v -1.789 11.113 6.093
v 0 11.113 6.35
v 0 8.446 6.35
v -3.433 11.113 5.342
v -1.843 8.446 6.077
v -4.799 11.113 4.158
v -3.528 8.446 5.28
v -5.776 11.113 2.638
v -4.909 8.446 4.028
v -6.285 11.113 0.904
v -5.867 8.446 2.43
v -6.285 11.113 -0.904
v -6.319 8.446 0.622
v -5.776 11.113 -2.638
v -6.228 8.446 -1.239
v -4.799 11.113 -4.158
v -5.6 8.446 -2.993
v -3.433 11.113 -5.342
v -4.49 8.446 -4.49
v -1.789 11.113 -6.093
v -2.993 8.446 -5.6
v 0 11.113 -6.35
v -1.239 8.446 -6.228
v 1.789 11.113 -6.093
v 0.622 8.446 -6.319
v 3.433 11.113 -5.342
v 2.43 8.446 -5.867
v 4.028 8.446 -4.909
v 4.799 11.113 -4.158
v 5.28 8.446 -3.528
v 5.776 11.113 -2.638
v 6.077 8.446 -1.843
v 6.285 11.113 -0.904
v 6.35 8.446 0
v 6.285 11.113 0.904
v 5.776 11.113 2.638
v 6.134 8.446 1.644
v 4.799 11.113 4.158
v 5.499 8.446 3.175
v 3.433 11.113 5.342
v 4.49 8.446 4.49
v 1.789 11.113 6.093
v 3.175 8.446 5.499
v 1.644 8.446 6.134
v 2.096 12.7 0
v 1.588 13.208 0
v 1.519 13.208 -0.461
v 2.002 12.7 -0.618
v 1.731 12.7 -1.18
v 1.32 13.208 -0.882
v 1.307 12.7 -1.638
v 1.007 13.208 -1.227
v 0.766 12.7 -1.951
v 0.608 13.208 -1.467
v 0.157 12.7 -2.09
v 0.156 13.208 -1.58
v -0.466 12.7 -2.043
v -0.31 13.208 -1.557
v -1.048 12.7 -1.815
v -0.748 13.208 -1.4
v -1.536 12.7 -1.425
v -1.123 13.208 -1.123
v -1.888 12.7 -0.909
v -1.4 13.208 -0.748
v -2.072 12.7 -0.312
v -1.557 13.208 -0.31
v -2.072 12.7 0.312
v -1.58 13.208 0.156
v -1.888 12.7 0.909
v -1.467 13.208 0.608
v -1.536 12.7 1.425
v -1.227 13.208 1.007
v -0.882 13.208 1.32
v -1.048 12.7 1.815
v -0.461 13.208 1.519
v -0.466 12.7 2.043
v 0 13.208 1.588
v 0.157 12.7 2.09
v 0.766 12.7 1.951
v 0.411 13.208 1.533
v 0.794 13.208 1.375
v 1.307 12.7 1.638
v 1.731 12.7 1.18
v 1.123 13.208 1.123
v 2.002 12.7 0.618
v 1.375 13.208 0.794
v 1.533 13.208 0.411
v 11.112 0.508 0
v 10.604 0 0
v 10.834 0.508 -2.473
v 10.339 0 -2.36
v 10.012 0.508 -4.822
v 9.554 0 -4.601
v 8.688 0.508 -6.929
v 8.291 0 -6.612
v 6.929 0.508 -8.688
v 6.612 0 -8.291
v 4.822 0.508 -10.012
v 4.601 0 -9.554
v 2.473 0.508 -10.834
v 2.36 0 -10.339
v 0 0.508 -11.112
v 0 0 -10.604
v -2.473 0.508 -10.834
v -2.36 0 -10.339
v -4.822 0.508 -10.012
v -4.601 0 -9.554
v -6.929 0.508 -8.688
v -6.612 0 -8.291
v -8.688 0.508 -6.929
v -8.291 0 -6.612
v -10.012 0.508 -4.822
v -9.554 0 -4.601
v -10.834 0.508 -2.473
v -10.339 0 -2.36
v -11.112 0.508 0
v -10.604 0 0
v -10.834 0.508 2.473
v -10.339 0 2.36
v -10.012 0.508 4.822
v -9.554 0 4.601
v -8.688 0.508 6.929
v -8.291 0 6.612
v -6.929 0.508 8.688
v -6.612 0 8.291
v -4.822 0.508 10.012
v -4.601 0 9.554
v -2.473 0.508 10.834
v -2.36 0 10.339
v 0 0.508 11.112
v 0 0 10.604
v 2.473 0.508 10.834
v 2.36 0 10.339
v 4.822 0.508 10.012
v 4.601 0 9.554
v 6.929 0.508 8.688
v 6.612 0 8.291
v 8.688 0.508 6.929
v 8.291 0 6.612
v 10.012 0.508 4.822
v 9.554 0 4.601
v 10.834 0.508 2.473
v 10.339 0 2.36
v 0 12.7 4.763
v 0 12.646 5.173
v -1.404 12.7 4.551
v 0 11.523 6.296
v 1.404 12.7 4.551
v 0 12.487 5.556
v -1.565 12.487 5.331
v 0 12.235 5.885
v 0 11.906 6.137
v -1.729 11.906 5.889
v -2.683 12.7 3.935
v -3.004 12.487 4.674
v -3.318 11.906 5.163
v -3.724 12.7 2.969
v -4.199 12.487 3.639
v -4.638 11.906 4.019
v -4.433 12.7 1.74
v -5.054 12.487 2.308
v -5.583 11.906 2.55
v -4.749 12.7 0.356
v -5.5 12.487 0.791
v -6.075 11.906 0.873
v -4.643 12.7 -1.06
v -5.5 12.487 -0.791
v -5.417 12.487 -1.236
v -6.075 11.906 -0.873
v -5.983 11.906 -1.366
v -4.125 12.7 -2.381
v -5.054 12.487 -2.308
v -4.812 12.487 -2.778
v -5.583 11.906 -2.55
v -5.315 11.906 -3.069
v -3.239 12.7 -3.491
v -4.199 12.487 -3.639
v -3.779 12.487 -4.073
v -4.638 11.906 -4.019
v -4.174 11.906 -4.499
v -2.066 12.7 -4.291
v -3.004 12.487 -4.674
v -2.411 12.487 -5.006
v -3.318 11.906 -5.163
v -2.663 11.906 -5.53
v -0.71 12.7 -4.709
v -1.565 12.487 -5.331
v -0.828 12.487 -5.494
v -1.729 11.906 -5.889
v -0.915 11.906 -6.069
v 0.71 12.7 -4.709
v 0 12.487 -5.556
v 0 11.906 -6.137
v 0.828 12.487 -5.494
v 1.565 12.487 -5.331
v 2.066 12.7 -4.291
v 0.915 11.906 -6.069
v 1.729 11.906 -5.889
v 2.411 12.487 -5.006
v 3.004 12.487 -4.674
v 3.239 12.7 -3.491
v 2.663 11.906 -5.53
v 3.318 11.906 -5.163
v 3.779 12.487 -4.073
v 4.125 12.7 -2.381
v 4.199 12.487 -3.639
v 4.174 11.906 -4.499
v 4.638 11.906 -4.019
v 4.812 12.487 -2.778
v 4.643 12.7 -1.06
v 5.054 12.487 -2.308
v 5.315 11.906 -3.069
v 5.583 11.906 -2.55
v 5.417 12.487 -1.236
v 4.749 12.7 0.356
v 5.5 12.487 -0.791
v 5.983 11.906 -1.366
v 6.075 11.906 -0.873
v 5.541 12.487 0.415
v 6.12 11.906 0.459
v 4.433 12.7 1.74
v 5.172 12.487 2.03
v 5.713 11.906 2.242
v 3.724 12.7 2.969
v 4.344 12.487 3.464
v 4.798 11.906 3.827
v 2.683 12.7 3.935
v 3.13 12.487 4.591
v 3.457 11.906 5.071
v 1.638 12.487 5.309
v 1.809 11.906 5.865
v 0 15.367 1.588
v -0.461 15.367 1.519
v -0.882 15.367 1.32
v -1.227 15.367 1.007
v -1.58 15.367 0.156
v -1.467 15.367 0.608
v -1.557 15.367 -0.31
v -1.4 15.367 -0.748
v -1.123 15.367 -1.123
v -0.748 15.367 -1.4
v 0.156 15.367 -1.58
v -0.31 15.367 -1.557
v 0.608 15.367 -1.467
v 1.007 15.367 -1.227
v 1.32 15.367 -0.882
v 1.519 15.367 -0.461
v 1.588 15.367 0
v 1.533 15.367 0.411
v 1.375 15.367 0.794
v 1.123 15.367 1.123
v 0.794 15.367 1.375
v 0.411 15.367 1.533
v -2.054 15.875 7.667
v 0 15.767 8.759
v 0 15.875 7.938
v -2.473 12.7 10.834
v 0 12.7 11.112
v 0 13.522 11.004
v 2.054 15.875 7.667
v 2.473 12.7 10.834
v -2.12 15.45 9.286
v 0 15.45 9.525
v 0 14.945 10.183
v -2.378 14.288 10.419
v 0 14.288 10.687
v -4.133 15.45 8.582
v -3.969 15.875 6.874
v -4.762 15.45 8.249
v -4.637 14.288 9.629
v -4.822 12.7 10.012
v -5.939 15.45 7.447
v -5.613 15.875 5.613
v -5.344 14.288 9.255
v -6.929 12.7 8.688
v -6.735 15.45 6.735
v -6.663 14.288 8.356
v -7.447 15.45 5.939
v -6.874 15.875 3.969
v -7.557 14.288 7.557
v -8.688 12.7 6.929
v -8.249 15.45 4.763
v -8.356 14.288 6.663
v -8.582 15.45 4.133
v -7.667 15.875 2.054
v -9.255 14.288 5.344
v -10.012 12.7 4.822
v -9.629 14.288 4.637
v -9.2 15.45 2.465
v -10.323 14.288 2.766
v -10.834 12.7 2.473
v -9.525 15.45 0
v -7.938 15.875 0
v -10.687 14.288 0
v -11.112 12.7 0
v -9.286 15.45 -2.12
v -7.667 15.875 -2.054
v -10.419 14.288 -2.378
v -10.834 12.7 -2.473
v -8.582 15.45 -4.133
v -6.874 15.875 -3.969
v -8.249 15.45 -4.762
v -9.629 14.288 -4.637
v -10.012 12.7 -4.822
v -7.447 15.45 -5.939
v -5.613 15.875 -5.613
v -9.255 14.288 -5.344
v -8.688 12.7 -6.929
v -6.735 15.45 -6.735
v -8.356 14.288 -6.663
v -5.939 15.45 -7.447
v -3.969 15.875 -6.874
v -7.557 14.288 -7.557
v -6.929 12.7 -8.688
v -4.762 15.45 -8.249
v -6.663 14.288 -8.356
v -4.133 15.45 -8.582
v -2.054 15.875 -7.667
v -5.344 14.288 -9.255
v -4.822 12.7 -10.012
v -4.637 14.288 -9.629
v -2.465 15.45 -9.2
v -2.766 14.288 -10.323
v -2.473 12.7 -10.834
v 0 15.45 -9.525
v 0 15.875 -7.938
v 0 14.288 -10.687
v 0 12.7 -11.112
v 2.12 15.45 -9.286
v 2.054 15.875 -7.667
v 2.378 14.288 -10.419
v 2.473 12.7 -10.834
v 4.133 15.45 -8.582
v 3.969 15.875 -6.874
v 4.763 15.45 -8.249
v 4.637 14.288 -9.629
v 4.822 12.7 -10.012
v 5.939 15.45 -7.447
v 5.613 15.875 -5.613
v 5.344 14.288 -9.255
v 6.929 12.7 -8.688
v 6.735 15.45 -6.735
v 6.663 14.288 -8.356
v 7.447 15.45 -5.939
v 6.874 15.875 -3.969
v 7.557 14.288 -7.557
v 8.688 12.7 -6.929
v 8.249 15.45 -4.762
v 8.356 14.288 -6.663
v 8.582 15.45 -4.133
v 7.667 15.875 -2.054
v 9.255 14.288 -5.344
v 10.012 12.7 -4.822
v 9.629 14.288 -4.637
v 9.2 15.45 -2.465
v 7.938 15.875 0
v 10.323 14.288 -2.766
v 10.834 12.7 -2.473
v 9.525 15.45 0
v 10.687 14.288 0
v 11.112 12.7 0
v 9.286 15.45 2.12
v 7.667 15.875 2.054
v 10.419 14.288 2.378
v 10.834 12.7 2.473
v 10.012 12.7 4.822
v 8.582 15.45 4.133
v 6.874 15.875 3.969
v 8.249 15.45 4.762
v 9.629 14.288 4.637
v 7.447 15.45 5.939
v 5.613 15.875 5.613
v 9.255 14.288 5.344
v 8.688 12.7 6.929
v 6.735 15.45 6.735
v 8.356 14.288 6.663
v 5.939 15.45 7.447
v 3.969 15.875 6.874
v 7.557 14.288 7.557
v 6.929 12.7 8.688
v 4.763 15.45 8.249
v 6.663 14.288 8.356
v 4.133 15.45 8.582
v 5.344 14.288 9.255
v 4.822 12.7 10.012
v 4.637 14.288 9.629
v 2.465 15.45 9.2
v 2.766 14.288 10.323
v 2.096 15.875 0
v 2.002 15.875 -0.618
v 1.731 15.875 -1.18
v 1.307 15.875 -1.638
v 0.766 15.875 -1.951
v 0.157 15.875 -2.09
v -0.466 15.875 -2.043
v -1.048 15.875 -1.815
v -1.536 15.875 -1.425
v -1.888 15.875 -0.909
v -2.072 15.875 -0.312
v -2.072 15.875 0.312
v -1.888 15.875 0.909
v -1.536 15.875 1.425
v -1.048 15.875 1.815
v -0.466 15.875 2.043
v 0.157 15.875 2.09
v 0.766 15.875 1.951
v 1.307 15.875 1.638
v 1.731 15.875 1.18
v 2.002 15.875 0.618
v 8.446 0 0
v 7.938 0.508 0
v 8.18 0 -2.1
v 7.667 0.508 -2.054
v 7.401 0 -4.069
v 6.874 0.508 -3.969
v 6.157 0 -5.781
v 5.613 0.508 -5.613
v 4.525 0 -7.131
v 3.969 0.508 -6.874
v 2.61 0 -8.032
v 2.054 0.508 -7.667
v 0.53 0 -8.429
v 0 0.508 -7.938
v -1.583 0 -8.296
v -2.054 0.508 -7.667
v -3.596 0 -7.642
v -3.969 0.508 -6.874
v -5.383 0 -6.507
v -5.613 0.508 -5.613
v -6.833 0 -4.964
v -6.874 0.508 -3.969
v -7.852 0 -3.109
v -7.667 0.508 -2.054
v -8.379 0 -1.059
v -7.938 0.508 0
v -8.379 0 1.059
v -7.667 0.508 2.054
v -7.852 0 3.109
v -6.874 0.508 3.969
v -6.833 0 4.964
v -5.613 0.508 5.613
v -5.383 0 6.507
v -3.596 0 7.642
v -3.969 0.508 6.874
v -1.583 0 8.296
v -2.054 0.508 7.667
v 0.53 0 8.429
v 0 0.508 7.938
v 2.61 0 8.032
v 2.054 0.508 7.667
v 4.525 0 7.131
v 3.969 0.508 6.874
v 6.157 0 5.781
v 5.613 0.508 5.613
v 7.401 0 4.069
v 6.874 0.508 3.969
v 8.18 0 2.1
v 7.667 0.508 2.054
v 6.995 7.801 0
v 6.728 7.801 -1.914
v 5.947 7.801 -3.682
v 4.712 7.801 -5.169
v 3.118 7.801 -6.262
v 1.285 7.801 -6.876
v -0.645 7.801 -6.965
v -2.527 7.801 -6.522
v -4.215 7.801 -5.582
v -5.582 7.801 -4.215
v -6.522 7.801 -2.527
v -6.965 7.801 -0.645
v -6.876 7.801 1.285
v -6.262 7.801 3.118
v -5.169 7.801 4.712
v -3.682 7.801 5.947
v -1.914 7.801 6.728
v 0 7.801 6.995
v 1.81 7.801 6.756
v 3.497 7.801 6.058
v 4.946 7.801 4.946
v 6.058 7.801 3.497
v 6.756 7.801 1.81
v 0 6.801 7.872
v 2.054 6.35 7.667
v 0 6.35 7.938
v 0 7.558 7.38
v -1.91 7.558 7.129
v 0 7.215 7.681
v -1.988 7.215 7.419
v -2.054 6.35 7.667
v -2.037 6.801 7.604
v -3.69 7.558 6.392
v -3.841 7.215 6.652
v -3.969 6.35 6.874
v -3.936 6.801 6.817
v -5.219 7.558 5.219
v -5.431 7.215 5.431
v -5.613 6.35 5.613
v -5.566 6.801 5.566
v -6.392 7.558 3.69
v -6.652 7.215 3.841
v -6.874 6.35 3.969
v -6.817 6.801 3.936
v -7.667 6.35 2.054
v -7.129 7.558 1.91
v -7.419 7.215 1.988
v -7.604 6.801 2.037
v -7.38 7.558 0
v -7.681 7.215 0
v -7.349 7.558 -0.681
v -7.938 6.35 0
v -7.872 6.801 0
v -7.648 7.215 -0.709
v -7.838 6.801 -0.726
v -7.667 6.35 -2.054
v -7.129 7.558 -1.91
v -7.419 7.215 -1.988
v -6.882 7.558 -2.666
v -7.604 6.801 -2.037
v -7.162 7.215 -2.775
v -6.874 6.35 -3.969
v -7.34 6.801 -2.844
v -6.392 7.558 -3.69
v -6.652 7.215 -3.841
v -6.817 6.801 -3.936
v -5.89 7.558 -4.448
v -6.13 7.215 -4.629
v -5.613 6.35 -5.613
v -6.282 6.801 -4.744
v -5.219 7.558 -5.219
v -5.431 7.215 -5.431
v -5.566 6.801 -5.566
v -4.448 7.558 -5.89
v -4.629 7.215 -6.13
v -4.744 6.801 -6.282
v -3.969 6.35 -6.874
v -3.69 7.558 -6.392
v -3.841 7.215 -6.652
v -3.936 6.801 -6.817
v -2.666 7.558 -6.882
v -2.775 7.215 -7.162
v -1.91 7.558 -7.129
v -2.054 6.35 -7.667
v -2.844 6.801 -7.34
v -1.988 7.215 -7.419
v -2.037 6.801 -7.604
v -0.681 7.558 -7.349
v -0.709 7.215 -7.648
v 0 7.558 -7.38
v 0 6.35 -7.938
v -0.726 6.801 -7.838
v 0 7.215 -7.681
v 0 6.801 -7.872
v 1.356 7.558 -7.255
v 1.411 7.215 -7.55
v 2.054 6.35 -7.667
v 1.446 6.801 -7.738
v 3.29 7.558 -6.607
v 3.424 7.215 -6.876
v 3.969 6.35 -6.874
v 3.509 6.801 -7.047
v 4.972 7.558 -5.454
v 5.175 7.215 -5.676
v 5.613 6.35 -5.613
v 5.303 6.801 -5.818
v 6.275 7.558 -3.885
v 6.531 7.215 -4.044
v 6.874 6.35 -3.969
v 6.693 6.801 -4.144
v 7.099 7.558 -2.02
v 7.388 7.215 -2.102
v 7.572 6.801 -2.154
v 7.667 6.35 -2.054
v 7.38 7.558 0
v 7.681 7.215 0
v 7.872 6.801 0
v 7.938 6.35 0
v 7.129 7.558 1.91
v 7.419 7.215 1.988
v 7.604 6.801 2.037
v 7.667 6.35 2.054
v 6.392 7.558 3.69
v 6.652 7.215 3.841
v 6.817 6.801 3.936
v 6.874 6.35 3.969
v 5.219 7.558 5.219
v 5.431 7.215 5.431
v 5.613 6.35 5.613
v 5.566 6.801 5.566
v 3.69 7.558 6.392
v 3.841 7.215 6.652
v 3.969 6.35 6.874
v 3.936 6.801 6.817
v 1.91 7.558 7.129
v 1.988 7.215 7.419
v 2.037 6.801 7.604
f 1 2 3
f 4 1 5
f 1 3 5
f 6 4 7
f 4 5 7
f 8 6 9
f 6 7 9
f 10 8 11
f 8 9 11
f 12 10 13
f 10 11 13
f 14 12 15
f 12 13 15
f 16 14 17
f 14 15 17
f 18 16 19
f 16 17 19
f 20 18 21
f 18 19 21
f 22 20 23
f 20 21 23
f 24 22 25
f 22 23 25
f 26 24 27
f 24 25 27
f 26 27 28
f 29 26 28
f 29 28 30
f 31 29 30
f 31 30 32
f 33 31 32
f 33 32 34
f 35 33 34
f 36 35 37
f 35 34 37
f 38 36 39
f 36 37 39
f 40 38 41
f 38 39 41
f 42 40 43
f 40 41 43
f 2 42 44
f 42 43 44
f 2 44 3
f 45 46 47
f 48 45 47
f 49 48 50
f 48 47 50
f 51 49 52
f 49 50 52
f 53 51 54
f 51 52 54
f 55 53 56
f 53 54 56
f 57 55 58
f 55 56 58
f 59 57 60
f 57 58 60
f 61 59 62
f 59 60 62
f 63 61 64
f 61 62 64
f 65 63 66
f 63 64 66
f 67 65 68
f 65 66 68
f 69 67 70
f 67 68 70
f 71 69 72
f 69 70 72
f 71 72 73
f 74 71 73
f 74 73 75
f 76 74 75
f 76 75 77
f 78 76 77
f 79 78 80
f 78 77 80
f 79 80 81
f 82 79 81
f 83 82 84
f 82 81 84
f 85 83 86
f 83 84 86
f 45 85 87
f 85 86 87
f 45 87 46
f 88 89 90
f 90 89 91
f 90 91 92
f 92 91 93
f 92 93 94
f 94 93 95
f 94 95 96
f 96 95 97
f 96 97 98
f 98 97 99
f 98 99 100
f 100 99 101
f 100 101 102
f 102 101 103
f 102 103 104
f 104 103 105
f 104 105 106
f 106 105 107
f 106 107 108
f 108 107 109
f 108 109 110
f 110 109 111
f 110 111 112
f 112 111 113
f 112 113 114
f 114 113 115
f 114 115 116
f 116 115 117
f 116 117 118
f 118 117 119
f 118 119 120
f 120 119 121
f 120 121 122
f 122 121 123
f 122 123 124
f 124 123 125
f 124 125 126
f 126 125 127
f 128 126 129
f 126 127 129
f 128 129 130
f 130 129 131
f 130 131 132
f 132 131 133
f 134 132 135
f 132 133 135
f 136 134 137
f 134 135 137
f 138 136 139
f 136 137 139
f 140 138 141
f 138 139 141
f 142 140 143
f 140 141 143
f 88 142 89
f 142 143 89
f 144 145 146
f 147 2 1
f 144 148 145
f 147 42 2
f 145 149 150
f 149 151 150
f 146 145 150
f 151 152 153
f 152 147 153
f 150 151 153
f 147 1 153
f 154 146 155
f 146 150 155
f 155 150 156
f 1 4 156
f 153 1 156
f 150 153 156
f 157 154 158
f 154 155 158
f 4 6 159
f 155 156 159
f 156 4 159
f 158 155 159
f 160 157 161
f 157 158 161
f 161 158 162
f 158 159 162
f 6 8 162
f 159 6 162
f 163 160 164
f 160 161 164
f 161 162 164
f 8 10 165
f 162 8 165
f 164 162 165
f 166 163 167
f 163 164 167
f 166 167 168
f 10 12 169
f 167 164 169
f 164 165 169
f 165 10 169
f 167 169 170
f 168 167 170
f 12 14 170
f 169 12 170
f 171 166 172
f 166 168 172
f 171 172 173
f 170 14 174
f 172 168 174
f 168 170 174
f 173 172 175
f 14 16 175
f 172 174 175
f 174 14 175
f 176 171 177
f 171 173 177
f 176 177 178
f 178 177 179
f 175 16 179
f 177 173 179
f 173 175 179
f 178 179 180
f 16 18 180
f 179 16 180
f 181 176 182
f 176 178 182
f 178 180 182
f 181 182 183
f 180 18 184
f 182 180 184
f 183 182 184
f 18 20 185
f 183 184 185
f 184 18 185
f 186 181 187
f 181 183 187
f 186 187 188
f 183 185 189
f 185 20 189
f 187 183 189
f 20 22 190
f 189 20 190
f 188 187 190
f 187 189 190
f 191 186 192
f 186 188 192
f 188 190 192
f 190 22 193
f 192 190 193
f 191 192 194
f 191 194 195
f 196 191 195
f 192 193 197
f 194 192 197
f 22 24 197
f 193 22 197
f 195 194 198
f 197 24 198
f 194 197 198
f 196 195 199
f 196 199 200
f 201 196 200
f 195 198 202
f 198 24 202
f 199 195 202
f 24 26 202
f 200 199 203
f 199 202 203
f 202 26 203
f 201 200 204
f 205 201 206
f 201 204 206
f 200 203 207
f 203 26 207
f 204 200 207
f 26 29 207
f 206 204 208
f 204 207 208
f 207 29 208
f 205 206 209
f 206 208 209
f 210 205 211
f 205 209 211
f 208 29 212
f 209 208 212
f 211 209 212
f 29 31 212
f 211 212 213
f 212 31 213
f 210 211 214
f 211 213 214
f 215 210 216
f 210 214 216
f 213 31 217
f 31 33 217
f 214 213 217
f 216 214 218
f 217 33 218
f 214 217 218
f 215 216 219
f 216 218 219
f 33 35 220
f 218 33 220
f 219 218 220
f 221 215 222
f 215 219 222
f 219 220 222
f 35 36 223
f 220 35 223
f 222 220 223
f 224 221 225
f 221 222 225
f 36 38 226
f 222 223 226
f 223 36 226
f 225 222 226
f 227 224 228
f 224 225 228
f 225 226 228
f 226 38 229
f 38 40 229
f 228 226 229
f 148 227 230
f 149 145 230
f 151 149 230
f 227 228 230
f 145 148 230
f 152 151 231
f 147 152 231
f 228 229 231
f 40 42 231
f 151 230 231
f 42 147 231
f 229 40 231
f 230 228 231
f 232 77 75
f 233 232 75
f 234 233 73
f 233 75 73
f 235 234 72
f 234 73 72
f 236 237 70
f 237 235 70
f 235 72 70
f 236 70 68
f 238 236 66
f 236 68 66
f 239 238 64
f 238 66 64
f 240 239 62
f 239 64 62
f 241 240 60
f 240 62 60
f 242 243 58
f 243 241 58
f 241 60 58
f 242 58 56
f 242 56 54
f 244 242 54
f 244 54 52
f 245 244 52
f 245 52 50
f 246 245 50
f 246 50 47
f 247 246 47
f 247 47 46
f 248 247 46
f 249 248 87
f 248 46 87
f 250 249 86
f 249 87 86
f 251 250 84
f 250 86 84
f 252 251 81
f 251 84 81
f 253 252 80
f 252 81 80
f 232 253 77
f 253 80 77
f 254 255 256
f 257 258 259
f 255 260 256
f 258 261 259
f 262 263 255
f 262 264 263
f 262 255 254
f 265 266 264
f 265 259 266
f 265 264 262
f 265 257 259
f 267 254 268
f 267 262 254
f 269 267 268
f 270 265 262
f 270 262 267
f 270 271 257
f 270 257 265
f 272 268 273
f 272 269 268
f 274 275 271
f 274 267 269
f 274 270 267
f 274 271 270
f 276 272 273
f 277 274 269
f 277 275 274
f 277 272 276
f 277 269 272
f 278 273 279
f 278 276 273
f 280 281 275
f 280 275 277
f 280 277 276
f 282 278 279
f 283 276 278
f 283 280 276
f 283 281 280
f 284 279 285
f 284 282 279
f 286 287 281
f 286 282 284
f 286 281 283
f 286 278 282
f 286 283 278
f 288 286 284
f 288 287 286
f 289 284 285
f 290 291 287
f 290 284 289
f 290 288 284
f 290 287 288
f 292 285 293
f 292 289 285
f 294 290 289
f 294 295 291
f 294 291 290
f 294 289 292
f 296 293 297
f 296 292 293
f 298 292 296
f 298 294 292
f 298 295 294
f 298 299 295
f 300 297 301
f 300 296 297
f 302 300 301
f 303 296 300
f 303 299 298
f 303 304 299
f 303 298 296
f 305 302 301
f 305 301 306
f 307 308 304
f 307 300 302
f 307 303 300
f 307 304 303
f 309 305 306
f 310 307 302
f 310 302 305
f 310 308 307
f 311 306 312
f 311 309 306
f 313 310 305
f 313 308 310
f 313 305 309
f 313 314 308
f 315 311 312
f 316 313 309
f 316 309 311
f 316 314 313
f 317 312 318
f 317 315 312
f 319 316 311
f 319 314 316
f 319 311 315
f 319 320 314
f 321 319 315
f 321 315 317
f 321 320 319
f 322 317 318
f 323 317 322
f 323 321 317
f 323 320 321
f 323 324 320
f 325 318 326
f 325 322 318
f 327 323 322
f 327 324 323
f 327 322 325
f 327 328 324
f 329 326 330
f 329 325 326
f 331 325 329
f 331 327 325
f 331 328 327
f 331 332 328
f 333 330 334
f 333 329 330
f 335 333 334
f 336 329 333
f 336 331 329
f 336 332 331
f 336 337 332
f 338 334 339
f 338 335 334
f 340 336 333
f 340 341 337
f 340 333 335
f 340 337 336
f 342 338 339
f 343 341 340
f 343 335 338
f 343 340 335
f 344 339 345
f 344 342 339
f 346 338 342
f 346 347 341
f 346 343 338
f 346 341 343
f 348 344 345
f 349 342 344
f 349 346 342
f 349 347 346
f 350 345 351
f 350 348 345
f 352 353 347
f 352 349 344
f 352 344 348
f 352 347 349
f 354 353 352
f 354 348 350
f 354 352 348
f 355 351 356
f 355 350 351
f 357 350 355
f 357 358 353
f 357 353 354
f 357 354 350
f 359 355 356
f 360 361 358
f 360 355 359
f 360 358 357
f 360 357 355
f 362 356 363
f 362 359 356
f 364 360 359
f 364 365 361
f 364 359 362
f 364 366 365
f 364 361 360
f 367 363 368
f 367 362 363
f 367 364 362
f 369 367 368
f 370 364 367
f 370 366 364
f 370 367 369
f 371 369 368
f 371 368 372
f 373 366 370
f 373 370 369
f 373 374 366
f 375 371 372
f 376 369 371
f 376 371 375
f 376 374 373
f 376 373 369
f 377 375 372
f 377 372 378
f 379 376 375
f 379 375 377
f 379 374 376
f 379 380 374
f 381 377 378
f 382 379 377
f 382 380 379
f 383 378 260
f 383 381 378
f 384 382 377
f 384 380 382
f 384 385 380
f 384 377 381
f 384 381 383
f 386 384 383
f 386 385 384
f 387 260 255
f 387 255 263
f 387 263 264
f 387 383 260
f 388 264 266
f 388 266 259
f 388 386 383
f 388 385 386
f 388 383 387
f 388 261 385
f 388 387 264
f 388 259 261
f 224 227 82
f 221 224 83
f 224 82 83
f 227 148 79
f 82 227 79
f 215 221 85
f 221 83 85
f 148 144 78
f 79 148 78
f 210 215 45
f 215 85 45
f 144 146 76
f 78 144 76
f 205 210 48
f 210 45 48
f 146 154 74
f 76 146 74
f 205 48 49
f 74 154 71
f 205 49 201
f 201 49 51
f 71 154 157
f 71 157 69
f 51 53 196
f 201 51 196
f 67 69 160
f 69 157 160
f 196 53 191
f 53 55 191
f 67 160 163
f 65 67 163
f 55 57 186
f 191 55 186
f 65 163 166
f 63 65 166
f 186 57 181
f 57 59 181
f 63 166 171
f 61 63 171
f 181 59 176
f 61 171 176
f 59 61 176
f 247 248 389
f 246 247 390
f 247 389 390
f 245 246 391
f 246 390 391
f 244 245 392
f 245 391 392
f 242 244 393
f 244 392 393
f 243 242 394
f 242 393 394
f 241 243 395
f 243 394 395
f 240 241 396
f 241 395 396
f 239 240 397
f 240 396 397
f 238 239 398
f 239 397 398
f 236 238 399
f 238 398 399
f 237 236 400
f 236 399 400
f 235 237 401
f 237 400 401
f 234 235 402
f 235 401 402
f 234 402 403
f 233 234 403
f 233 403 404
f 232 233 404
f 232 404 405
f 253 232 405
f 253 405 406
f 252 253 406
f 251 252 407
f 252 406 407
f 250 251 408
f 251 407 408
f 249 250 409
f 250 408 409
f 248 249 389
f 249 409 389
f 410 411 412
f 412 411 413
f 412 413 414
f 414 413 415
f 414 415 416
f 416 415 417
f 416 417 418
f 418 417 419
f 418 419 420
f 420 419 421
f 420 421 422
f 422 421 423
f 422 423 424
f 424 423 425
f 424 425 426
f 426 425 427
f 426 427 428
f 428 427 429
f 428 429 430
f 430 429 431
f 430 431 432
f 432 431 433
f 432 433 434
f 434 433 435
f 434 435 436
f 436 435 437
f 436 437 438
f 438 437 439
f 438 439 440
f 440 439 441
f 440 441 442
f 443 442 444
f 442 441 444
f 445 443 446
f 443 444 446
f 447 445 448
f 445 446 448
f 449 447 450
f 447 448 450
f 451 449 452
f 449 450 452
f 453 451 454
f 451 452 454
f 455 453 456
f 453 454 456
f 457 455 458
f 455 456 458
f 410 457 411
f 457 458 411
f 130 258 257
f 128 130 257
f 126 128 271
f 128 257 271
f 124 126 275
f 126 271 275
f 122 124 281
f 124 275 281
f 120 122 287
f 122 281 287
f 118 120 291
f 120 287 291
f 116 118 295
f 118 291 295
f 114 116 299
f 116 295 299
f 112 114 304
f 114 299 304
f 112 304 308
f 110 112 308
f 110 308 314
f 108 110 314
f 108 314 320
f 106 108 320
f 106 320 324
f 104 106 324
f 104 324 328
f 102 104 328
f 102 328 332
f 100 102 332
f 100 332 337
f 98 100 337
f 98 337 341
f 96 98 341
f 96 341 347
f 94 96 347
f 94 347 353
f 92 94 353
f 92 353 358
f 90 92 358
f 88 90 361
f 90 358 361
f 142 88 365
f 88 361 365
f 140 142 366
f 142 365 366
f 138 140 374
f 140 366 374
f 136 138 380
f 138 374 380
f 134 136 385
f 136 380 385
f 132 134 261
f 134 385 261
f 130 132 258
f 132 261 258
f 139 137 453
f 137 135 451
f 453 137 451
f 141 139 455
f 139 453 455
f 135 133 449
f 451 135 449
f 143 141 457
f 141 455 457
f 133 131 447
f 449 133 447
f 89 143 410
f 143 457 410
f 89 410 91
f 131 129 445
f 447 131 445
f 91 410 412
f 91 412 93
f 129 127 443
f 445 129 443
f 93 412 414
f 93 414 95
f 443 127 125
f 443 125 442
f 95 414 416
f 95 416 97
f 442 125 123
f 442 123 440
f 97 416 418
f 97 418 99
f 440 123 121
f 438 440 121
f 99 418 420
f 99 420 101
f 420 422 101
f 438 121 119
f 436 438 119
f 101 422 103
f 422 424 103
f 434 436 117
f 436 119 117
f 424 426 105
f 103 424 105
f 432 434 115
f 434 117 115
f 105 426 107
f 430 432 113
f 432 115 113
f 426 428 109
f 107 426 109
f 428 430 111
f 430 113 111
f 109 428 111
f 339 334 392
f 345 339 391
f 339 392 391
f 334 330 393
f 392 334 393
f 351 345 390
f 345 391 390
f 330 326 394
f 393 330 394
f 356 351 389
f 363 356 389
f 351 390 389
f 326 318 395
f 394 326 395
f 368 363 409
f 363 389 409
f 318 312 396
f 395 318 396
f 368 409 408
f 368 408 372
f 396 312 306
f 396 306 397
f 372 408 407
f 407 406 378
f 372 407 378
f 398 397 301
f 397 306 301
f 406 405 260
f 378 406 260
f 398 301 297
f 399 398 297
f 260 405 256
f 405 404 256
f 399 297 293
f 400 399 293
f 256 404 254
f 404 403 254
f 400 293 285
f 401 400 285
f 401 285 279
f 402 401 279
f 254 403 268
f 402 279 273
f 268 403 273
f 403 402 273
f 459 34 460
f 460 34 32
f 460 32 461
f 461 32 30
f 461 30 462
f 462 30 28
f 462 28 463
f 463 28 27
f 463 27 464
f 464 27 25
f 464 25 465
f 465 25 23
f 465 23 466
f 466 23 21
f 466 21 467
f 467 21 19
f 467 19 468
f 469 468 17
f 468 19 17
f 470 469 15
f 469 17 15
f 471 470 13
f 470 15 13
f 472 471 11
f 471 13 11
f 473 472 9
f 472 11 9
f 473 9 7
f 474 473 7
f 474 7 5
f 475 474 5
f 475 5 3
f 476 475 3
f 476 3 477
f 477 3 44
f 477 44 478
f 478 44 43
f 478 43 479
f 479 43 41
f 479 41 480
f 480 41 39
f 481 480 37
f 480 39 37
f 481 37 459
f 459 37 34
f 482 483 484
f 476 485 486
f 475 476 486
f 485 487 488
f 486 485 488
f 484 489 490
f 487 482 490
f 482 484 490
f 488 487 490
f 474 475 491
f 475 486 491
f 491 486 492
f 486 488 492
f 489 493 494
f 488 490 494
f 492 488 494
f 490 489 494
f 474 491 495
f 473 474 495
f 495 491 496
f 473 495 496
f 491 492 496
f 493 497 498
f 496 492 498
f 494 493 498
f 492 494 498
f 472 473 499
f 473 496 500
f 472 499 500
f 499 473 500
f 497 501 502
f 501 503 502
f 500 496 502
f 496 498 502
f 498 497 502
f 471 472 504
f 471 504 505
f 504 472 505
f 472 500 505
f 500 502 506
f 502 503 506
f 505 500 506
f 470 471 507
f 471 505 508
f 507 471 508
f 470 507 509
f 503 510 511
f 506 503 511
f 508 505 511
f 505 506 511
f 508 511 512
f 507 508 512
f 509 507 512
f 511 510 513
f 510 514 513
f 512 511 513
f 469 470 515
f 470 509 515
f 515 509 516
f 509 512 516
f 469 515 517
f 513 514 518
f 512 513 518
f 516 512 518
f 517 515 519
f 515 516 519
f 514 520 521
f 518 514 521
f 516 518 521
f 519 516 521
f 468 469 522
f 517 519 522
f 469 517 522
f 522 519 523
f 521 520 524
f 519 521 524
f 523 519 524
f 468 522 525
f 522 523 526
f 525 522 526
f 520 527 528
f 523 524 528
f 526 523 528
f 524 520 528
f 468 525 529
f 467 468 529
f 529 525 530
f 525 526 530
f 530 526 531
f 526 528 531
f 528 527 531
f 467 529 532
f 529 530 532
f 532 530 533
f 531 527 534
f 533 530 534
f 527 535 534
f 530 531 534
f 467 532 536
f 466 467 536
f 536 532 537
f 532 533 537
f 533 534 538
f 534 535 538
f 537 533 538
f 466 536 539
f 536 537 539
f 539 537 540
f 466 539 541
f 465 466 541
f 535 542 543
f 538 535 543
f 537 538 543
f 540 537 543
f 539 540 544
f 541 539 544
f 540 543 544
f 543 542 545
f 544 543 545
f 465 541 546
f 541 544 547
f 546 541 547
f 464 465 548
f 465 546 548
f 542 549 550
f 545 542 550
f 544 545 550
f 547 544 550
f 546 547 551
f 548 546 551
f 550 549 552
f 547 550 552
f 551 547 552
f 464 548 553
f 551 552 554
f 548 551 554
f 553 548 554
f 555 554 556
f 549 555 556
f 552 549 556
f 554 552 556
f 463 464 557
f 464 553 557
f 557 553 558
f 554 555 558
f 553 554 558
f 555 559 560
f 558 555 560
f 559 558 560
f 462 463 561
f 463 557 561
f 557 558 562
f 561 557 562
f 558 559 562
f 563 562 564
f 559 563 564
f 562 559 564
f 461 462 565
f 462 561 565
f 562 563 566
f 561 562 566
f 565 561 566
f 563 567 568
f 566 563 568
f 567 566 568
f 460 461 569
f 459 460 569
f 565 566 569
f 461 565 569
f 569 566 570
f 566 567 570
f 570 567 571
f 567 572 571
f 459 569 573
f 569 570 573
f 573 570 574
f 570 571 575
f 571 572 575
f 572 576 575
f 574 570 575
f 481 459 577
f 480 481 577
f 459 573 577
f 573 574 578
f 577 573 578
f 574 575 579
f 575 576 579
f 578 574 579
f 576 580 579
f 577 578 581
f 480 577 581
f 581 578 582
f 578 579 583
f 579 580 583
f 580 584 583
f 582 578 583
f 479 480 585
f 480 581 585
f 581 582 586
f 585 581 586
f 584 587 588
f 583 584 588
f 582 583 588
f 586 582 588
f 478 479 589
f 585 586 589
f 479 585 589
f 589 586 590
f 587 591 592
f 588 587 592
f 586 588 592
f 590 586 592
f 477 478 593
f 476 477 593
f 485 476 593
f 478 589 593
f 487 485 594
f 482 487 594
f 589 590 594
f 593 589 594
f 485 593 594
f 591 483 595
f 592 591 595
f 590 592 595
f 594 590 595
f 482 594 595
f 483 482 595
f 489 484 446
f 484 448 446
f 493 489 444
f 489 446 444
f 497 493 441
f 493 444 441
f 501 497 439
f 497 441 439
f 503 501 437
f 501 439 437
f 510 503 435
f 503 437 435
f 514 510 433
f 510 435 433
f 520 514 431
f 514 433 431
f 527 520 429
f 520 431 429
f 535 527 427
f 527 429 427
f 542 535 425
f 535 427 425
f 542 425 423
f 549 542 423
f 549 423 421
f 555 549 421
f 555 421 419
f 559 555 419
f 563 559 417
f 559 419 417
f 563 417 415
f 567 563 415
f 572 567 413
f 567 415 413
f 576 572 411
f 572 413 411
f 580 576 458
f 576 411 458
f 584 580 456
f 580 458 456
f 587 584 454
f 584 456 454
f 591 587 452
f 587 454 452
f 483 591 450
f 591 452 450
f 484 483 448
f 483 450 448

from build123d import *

# Parameters (mm, degrees)
FILLET1_R = 1.5875
FILLET2_R = 3.175


with BuildPart() as part:
    # Sketch1 → Revolve1 (revolve)
    with BuildSketch(Plane.XY, mode=Mode.PRIVATE) as revolve1_sk:
        Polygon((1.5875, 15.875), (1.5875, 12.7), (6.35, 12.7), (6.35, 7.9375), (7.9375, 7.9375), (7.9375, 0), (11.1125, 0), (11.1125, 15.875), align=None)
    revolve(revolve1_sk.sketch.rotate(Axis((0, 3.137063419, 0), (0, -1, 0)), 90), axis=Axis((0, 3.137063419, 0), (0, -1, 0)))

    # Fillet1
    fillet1_edges = [part.edges().sort_by_distance(p)[0] for p in [
        (0, 7.9375, -7.9375),
        (0, 12.7, -6.35),
    ]]
    fillet(fillet1_edges, radius=FILLET1_R - 0.0001)  # a hair under: the kernel refuses the full size

    # Fillet2
    fillet2_edges = [part.edges().sort_by_distance(p)[0] for p in [
        (0, 15.875, -11.1125),
    ]]
    fillet(fillet2_edges, radius=FILLET2_R)

    # Chamfer1: read off the stored shape, not the designer's step
    # Chamfer1 outline → Chamfer1 (revolve, cut)
    with BuildSketch(Plane.XY):
        Polygon((1.5875, 15.875), (1.5875, 15.367), (2.0955, 15.875), align=None)
        Polygon((2.0955, 12.7), (1.5875, 13.208), (1.5875, 12.7), align=None)
        Polygon((6.994887663, 7.800612337), (6.35, 8.4455), (6.35, 7.800612337), align=None)
        Polygon((8.4455, 0), (7.9375, 0.508), (7.9375, 0), align=None)
        Polygon((11.1125, 0.508), (10.6045, 0), (11.1125, 0), align=None)
    revolve(axis=Axis((0, 0, 0), (0, 1, 0)), mode=Mode.SUBTRACT)


solid = part.part
